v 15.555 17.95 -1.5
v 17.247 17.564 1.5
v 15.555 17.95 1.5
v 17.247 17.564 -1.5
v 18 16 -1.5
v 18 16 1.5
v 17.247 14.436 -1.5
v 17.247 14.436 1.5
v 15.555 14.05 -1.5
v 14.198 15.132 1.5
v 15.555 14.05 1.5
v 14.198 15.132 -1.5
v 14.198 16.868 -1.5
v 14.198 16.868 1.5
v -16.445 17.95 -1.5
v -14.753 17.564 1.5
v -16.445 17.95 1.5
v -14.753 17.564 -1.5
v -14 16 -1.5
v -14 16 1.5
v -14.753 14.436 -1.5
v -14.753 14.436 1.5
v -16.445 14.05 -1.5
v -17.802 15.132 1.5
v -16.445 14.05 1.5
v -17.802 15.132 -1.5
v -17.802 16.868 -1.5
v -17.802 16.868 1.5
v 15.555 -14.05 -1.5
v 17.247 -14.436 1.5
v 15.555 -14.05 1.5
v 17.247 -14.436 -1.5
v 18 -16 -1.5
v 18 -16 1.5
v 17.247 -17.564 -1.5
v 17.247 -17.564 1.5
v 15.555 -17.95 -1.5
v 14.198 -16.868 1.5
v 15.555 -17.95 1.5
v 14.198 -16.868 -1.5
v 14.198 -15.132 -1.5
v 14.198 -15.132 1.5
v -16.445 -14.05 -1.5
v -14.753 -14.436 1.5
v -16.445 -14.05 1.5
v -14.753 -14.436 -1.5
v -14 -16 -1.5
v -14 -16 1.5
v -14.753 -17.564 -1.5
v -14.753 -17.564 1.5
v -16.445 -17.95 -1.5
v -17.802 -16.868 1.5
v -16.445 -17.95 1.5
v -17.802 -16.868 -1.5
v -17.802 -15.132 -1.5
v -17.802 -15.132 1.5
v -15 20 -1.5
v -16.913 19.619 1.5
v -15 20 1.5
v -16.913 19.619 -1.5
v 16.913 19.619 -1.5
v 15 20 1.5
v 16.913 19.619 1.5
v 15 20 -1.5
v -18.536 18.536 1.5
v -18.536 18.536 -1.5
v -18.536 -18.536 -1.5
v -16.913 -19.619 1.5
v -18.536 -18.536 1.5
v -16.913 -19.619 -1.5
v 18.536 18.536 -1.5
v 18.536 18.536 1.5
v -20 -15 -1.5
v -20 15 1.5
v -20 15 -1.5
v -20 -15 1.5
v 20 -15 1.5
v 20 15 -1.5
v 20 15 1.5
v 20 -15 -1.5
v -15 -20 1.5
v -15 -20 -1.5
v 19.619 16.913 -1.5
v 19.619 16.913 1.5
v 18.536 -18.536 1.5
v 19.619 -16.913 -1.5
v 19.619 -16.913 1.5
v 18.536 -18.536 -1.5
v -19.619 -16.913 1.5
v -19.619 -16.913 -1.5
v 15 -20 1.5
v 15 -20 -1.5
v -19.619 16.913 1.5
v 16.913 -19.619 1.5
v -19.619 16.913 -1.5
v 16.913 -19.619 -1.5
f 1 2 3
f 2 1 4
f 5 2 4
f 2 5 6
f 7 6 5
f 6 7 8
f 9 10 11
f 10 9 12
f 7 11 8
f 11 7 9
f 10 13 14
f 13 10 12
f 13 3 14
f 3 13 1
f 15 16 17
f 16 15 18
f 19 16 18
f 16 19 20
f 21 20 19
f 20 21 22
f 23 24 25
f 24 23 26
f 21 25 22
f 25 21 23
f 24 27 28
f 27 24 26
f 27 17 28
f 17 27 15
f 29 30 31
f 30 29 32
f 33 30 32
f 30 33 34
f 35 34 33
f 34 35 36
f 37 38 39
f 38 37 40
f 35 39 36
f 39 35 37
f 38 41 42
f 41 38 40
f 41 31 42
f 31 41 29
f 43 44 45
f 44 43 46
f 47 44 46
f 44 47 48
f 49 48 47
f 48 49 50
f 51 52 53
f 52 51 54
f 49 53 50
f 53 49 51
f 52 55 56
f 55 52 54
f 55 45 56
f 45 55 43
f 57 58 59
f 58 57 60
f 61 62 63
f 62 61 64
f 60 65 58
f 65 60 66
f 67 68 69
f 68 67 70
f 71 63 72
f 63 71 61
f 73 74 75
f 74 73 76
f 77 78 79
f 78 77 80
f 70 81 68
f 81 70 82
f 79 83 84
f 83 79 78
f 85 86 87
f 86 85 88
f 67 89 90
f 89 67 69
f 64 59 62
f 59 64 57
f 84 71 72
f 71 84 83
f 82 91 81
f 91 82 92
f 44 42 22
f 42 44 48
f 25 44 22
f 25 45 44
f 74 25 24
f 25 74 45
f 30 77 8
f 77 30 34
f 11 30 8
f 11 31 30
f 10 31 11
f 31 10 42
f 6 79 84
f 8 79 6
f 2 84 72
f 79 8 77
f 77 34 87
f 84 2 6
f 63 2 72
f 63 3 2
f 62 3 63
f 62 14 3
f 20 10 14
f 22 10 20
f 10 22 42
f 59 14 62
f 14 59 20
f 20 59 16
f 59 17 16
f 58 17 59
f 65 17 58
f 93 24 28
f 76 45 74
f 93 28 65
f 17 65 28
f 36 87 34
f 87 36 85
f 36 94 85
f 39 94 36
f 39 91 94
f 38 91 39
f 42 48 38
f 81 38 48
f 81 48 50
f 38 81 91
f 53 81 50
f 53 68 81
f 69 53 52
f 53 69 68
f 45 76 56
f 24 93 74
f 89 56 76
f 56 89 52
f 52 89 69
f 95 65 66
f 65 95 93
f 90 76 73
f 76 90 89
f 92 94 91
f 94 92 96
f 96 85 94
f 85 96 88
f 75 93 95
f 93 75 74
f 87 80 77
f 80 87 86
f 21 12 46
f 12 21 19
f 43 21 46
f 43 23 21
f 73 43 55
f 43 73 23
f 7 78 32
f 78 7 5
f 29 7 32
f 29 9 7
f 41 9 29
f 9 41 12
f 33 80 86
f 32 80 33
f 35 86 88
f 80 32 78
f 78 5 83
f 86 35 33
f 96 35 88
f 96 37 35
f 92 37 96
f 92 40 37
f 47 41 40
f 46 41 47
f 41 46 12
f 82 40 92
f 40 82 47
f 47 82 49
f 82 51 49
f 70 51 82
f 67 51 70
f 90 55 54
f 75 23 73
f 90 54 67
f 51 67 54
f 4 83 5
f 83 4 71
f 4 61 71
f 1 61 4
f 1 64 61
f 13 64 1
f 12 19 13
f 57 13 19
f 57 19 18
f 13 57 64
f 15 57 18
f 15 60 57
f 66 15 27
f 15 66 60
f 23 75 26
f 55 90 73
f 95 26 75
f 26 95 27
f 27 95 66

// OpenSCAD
// file: ../primitives/rounded_rect.scad
module RoundedRect(x, y, z, r, centre=false)
{
  module OriginRect(x, y, z, r)
  {
    upper_x = x - r;
    upper_y = y - r;
    hull()
    {
      translate([r, r, 0])
        cylinder(r=r, h=z);
      translate([upper_x, r, 0])
        cylinder(r=r, h=z);
      translate([r, upper_y, 0])
        cylinder(r=r, h=z);
      translate([upper_x, upper_y, 0])
        cylinder(r=r, h=z);
    }
  }

  module CentreRect(x, y, z, r)
  {
    cx = (x / 2) - r;
    cy = (y / 2) - r;
    cz = -(z / 2);
    hull()
    {
      translate([-cx, -cy, cz])
        cylinder(r=r, h=z);
      translate([-cx, cy, cz])
        cylinder(r=r, h=z);
      translate([cx, -cy, cz])
        cylinder(r=r, h=z);
      translate([cx, cy, cz])
        cylinder(r=r, h=z);
    }
  }
  
  if(centre)
    CentreRect(x, y, z, r);
  else
    OriginRect(x, y, z, r);
}
// main file
include <../primitives/rounded_rect.scad>

module mountingHoles()
{
	dx = 16;
	dy = 16;
	radius = 2;
	translate([dx, dy, 0])
		cylinder(r=radius, h=20);
	translate([-dx, dy, 0])
		cylinder(r=radius, h=20);
	translate([dx, -dy, 0])
		cylinder(r=radius, h=20);
	translate([-dx, -dy, 0])
		cylinder(r=radius, h=20);
}

module piCameraAdapterRear() {
	difference() {
		difference() {
			RoundedRect(40, 40, 3, 5, centre=true);
			translate([0, 0, -10.1])
				mountingHoles();
		}
	}
}

piCameraAdapterRear();
